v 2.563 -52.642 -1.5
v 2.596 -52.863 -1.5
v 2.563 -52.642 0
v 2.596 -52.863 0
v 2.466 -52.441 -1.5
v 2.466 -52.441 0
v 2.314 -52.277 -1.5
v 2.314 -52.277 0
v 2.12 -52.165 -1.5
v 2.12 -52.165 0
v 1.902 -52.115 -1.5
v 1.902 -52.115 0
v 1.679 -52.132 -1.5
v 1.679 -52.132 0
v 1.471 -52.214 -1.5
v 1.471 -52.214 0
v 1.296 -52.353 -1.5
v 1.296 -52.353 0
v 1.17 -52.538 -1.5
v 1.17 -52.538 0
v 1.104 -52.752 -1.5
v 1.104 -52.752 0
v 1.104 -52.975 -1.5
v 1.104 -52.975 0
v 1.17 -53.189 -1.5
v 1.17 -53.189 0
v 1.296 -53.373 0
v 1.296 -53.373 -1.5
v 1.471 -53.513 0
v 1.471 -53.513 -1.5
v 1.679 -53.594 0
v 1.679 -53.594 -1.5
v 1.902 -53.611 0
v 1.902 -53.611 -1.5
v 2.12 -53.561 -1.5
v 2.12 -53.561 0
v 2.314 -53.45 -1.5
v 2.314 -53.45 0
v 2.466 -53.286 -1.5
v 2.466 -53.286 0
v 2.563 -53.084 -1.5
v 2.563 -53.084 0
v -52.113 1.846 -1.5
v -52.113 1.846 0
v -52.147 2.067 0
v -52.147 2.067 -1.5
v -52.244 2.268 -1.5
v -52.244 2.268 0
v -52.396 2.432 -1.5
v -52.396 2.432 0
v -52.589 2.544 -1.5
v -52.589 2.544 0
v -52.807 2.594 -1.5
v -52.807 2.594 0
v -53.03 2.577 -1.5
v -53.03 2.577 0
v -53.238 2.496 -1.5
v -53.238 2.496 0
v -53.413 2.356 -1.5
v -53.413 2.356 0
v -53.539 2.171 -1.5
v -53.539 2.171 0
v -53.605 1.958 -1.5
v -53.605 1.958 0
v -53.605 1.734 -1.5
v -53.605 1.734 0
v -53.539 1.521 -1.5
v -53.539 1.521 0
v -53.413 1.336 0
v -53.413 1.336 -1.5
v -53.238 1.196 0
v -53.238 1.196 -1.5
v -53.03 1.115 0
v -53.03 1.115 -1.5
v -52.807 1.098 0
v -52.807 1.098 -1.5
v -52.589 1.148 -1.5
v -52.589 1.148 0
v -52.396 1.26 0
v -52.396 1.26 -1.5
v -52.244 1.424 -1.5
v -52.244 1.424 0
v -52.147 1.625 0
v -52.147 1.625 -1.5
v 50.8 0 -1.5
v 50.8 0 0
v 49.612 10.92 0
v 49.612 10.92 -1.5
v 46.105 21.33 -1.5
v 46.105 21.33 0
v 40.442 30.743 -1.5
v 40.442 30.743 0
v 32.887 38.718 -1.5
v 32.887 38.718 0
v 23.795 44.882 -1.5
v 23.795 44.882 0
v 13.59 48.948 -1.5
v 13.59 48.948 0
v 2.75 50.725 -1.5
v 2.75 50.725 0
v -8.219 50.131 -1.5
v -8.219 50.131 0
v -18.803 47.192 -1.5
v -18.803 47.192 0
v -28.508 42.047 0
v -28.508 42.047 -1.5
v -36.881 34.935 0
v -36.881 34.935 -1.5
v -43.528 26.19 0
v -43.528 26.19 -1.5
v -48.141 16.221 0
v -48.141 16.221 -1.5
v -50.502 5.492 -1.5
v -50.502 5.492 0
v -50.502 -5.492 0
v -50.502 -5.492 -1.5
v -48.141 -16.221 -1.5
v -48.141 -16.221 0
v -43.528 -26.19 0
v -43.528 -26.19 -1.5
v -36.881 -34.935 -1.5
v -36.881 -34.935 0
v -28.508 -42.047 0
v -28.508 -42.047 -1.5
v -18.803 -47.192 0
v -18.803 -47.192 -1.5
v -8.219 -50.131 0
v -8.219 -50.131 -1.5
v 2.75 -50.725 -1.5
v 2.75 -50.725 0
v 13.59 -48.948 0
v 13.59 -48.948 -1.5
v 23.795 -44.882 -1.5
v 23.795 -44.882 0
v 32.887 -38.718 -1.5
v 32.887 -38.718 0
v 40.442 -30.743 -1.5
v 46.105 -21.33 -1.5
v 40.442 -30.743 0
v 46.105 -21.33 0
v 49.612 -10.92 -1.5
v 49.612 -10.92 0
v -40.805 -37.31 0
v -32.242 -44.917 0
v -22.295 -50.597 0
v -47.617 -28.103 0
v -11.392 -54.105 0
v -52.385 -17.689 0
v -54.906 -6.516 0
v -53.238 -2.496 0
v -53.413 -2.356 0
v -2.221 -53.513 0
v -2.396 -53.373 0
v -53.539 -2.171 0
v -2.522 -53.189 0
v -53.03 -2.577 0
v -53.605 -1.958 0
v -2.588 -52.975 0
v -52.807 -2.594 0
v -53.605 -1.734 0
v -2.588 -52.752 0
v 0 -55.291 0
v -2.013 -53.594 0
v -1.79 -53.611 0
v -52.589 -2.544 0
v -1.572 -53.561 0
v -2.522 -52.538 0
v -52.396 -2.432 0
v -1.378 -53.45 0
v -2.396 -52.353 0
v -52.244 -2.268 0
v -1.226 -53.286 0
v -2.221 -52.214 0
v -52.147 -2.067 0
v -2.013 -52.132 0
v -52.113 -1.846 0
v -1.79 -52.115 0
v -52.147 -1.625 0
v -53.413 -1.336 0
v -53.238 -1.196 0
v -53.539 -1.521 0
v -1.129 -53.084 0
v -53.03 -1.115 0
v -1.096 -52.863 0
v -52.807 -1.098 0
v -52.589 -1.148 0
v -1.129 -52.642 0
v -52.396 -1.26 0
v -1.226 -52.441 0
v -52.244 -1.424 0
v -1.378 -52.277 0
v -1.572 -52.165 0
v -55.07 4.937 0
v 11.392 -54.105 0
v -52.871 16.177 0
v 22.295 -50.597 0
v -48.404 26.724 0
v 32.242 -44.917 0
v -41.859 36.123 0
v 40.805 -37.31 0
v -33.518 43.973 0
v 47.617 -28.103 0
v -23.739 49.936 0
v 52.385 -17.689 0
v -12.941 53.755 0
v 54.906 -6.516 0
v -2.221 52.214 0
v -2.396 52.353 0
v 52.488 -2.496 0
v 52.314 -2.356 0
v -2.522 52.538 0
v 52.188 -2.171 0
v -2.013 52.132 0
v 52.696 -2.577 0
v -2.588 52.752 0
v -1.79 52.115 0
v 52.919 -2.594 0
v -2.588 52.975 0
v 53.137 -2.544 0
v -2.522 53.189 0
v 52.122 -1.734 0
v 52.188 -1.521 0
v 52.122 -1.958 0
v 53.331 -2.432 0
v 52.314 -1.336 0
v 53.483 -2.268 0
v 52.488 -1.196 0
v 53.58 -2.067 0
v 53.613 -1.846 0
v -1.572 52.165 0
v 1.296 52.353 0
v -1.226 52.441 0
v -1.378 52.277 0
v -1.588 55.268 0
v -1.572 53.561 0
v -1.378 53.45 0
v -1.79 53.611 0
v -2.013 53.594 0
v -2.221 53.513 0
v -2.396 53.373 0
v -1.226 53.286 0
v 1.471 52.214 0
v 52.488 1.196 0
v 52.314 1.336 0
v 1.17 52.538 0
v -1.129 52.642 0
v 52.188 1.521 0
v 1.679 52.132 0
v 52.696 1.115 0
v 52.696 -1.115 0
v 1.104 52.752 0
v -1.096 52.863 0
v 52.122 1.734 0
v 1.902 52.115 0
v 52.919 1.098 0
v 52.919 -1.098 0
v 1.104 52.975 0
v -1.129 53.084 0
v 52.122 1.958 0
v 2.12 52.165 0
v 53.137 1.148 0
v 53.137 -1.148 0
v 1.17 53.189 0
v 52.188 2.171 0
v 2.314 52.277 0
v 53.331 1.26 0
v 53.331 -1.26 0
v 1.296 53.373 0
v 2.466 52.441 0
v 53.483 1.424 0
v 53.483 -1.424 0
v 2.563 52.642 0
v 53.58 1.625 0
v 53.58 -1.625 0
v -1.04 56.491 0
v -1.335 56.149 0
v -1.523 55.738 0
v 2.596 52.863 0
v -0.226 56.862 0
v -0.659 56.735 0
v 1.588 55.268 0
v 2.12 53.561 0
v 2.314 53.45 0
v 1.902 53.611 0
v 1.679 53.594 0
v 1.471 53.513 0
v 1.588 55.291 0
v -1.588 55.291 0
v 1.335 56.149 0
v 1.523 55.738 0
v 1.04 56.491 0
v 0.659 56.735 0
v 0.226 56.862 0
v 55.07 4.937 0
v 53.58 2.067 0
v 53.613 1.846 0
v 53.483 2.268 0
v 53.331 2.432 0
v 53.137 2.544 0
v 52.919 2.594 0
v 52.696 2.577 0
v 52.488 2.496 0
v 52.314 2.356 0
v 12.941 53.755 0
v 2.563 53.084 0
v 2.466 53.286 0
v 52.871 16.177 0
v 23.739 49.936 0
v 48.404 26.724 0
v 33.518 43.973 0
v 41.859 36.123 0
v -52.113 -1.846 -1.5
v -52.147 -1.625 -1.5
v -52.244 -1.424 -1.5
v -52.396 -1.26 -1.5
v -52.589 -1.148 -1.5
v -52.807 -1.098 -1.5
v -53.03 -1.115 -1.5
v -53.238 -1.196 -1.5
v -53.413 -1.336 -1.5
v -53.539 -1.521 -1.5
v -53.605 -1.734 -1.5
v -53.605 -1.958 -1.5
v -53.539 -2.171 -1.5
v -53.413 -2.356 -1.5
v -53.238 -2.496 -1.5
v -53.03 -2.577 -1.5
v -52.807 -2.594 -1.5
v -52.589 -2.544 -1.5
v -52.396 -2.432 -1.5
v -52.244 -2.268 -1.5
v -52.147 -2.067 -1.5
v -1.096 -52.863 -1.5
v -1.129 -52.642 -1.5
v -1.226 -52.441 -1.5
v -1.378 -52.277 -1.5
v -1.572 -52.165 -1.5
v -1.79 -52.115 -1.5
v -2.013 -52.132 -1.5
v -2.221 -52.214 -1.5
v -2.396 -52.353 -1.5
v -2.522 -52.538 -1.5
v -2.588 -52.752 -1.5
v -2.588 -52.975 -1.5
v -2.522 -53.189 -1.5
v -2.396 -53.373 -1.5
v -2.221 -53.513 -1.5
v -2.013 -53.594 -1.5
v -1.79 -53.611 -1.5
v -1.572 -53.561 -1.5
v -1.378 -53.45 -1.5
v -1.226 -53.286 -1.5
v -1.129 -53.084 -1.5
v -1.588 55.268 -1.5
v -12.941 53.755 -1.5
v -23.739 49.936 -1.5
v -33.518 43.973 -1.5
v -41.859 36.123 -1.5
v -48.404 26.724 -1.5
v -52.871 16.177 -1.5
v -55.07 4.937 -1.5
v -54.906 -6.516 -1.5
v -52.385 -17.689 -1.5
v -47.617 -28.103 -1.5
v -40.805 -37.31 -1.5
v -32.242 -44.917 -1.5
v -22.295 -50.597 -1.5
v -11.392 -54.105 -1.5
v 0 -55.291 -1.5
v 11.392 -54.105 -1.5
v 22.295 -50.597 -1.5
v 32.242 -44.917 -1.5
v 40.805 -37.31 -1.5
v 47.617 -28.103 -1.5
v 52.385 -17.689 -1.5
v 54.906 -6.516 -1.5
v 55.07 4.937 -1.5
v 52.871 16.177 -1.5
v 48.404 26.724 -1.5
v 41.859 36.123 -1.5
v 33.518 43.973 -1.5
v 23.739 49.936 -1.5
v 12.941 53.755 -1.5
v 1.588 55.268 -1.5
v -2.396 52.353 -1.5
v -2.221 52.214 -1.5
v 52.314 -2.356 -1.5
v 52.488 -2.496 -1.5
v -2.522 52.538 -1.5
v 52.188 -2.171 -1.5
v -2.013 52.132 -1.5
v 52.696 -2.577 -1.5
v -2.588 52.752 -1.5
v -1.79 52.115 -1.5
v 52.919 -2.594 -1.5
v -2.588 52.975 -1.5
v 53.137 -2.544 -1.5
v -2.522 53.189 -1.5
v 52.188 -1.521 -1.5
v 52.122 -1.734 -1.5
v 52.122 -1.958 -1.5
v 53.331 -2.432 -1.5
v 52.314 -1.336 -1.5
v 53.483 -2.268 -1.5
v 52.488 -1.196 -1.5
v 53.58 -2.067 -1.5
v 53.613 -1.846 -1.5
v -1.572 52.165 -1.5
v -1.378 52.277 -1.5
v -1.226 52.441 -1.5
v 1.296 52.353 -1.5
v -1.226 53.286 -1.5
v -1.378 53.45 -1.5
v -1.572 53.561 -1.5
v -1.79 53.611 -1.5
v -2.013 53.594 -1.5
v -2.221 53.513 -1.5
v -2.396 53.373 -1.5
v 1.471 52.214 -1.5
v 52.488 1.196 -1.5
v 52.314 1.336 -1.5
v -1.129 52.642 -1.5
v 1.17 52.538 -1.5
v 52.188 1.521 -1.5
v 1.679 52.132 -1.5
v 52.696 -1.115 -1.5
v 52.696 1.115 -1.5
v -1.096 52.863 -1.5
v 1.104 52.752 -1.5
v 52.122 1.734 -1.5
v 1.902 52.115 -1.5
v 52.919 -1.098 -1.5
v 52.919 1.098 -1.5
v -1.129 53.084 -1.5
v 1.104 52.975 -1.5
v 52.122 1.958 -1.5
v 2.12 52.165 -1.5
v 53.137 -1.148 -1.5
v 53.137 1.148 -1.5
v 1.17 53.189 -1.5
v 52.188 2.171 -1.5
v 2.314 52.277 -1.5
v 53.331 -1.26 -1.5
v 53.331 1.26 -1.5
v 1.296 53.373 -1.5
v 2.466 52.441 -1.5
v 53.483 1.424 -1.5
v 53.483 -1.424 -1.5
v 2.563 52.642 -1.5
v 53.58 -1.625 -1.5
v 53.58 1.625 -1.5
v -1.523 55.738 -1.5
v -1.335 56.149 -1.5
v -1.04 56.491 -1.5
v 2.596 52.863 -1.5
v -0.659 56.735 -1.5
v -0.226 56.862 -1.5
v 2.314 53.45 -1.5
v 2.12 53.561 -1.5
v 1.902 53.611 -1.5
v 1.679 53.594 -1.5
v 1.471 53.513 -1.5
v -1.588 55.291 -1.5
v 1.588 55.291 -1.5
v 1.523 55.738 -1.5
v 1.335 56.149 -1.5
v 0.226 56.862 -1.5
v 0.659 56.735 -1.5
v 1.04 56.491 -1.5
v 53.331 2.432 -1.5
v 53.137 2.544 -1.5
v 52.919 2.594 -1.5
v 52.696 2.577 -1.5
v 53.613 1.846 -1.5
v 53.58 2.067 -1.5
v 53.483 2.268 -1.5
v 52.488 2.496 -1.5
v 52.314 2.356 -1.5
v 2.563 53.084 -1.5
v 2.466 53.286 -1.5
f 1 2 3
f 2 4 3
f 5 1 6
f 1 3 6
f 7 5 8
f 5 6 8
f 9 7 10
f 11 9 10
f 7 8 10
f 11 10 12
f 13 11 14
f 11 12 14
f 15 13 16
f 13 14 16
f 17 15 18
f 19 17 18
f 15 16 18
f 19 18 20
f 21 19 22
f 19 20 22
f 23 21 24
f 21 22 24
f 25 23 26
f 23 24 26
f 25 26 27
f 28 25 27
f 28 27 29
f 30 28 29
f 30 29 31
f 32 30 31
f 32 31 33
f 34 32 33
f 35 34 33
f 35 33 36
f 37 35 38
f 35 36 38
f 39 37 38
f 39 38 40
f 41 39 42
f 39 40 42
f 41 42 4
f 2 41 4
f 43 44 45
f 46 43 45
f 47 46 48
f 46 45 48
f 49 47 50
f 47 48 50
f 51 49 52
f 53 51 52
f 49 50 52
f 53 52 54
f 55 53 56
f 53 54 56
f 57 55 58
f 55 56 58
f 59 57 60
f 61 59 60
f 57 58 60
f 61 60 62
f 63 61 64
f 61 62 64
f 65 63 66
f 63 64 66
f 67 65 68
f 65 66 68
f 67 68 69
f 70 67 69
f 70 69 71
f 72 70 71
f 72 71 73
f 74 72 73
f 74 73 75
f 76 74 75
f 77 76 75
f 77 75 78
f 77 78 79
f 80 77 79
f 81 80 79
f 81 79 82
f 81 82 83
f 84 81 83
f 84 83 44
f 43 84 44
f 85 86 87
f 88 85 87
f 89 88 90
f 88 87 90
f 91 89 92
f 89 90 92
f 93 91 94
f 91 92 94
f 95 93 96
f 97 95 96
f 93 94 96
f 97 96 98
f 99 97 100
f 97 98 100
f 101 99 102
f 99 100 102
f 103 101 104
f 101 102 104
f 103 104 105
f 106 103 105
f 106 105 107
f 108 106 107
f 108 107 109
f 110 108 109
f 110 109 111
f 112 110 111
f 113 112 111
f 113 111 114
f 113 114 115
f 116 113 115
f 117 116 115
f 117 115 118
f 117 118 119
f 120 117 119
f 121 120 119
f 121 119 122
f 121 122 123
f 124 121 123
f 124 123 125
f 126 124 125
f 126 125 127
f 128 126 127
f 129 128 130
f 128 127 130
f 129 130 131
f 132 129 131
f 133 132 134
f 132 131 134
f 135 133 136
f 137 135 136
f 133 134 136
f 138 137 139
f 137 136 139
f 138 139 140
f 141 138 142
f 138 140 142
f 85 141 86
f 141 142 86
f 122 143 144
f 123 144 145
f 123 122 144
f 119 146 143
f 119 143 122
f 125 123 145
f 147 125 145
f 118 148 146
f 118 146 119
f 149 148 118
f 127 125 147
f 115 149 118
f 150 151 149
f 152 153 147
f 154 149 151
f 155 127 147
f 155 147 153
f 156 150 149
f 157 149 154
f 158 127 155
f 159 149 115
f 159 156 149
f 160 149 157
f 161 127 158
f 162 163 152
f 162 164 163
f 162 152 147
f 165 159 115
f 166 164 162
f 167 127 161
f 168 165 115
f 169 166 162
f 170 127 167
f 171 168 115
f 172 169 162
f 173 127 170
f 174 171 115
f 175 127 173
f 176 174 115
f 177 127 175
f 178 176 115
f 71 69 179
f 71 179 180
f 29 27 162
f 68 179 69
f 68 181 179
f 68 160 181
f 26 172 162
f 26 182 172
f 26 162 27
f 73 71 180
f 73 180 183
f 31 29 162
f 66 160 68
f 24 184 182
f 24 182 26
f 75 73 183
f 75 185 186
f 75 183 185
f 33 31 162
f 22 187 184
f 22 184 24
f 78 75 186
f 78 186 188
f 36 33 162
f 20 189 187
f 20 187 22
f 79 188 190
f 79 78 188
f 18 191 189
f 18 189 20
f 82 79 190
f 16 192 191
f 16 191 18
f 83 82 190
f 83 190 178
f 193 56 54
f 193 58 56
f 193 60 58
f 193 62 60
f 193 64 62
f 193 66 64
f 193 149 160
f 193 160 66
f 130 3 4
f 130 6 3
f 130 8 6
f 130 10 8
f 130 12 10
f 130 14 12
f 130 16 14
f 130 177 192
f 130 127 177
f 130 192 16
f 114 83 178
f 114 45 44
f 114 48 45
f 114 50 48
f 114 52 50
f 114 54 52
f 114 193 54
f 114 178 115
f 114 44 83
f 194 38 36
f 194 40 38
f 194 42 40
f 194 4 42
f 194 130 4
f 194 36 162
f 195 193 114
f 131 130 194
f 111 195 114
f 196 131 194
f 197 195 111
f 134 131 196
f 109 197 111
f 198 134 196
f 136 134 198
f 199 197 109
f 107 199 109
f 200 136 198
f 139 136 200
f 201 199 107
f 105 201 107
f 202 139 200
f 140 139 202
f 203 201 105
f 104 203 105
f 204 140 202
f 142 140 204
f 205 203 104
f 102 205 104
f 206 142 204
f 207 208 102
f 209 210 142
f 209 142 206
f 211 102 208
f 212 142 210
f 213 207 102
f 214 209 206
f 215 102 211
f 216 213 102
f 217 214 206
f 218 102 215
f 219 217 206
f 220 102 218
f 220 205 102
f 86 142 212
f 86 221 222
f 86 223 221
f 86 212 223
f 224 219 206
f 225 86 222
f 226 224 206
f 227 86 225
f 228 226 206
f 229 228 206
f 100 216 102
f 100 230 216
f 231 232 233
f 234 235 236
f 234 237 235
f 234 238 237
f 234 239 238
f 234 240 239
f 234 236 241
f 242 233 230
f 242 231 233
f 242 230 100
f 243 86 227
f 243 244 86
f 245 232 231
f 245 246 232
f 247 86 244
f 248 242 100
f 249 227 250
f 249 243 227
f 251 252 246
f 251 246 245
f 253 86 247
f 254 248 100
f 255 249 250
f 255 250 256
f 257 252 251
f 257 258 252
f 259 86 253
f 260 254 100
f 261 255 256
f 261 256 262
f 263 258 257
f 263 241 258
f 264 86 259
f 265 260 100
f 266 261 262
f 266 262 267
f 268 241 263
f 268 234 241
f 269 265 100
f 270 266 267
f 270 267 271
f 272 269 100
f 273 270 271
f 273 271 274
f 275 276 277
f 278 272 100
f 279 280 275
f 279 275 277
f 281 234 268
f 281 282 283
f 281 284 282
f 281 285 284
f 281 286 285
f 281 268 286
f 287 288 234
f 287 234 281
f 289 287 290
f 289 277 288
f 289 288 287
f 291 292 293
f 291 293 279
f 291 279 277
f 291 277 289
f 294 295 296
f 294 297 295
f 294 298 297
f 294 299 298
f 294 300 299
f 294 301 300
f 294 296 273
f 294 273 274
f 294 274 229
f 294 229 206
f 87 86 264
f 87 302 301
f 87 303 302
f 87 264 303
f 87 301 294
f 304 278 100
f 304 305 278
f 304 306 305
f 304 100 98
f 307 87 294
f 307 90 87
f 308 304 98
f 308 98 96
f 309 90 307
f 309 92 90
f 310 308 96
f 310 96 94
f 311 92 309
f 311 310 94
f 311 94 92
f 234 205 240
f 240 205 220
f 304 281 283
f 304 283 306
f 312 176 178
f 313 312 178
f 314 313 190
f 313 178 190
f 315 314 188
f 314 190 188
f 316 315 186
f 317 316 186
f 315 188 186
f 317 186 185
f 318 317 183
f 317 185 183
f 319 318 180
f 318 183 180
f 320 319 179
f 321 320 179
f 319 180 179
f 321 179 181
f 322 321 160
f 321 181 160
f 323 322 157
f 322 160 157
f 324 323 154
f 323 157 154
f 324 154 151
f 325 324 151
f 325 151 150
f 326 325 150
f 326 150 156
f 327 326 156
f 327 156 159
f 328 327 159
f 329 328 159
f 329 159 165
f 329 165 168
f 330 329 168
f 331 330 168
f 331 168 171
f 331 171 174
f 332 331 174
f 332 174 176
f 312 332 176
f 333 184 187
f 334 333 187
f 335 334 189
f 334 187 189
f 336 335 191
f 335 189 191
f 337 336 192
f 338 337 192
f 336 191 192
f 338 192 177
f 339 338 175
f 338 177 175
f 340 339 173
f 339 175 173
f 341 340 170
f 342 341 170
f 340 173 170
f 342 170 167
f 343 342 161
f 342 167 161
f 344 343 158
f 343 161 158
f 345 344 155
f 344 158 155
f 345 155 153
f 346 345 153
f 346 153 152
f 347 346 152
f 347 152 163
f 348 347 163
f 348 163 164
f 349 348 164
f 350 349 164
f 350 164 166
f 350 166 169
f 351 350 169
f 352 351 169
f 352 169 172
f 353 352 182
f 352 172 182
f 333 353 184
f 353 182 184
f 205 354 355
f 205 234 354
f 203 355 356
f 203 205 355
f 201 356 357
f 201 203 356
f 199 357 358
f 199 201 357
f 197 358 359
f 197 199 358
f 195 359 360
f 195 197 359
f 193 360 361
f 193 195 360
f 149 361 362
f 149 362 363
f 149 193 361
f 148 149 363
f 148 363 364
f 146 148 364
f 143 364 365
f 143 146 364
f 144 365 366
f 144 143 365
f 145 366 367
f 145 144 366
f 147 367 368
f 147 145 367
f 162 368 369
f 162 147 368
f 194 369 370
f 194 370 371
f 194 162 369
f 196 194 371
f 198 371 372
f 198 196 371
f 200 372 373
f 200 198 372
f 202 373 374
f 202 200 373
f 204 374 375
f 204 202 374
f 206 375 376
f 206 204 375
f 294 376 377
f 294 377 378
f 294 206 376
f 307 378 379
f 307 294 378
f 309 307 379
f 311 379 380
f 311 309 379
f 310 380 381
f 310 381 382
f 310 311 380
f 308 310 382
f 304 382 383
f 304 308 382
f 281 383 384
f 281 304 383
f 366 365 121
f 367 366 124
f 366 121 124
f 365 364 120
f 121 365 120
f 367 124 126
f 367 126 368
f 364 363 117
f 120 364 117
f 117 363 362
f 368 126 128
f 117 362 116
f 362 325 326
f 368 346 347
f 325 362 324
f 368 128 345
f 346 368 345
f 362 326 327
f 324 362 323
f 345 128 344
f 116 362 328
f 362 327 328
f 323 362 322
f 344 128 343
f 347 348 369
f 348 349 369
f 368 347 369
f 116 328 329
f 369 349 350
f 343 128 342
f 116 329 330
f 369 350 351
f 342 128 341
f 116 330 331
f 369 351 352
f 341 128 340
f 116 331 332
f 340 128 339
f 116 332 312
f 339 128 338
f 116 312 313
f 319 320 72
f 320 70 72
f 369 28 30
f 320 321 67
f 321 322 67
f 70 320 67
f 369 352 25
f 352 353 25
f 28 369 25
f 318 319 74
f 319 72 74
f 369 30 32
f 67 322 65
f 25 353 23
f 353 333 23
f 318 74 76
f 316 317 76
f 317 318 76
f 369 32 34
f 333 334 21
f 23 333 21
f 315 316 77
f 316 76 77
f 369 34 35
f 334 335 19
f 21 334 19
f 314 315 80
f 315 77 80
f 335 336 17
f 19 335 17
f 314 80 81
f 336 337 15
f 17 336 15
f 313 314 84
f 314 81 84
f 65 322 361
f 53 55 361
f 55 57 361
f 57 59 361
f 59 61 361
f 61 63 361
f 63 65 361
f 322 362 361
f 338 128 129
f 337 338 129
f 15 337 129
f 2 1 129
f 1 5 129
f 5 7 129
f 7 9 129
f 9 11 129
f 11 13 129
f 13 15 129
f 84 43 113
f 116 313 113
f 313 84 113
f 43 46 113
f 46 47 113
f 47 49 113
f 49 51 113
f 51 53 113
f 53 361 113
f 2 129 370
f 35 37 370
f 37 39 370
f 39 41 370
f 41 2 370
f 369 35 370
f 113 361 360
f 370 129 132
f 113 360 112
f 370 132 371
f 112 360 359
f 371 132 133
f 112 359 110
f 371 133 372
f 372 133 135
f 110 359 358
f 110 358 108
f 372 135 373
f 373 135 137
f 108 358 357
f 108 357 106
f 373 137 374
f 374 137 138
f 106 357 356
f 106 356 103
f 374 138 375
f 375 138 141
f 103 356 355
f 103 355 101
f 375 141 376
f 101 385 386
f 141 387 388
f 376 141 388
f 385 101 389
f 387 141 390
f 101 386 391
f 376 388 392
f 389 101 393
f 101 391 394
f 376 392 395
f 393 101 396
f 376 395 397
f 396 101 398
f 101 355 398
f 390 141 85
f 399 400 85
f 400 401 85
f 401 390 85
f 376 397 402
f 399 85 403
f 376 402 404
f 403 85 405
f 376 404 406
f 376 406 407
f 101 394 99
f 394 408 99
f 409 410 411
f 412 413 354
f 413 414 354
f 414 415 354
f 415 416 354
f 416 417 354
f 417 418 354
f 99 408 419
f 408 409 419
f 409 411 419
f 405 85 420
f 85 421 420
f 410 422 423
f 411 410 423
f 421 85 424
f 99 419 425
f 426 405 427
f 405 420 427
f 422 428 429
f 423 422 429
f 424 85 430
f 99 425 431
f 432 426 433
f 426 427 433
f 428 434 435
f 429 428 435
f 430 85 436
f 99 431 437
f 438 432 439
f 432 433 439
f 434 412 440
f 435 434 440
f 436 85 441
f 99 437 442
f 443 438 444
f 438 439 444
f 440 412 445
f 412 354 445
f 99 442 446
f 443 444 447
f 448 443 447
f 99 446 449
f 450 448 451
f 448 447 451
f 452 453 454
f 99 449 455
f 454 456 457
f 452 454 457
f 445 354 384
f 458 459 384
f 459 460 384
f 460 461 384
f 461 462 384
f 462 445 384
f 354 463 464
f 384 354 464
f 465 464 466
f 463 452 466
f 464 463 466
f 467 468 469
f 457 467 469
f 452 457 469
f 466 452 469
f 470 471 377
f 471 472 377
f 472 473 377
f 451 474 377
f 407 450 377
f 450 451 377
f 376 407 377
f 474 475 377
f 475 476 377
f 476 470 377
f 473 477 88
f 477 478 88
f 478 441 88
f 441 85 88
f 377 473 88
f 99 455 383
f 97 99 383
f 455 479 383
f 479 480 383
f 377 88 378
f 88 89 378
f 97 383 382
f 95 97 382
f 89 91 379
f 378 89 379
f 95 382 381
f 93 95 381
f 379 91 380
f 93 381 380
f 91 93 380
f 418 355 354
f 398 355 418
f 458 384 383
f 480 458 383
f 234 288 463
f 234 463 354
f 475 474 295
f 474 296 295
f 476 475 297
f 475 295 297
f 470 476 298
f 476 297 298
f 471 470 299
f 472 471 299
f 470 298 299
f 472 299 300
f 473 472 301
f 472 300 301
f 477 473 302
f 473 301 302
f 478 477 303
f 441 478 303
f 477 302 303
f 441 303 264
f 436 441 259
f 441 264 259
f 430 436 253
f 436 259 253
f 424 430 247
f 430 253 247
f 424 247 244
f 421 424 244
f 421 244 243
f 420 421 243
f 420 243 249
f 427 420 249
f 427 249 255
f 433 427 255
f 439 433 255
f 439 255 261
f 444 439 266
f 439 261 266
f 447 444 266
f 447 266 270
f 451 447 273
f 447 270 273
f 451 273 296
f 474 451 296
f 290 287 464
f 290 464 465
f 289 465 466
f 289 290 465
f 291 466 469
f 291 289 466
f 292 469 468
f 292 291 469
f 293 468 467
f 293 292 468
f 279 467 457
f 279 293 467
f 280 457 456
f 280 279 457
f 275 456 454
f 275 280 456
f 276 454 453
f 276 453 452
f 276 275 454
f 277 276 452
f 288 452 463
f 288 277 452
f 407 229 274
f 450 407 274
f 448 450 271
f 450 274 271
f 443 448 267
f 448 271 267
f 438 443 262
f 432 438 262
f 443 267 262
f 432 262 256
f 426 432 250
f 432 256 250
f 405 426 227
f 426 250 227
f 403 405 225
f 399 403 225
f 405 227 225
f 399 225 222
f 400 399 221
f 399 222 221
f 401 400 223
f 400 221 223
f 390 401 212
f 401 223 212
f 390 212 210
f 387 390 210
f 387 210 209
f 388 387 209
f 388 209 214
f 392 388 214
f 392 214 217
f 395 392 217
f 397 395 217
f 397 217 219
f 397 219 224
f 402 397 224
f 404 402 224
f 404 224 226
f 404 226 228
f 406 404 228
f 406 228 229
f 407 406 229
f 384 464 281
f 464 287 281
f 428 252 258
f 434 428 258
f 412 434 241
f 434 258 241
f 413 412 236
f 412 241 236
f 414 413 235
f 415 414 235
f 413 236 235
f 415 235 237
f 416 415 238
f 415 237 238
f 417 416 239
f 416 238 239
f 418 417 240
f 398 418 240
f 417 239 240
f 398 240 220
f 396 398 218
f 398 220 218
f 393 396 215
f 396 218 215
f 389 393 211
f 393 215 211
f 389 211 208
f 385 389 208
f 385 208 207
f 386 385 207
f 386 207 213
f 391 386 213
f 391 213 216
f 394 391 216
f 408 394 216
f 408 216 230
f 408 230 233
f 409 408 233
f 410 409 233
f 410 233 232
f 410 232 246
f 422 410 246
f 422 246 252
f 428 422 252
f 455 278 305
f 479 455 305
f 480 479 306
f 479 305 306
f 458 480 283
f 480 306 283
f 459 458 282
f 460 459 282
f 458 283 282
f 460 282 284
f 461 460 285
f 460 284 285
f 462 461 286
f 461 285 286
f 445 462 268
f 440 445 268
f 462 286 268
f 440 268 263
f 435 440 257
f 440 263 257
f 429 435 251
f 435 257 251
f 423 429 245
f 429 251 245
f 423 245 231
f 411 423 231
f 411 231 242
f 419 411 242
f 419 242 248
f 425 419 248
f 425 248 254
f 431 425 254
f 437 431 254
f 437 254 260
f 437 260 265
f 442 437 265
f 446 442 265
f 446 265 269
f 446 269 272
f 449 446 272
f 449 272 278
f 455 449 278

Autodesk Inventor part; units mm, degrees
ref_plane "YZ Plane" through (0, 0, 0) normal (1, 0, 0) x (0, 1, 0)
ref_plane "XZ Plane" through (0, 0, 0) normal (0, 1, 0) x (-1, 0, 0)
ref_plane "XY Plane" through (0, 0, 0) normal (0, 0, 1) x (1, 0, 0)
sketch "Sketch1" plane through (0, 0, 0) normal (0, 0, 1) x (1, 0, 0)
  arc A0 (-1.5875, 55.2682) -> (1.5875, 55.2682) centre (0, 0) ccw
  circle A1 centre (0, 0) radius 50.8
  line L0 (0, 79.3124) -> (0, -77.7249) construction
  line L1 (-77.4074, 0) -> (77.4074, 0) construction
  circle A2 centre (0, 0) radius 52.8955 construction
  circle A3 centre (-1.846, 52.8633) radius 0.75
  circle A4 centre (1.846, 52.8633) radius 0.75
  circle A5 centre (-52.8633, -1.846) radius 0.75
  circle A6 centre (-52.8633, 1.846) radius 0.75
  circle A7 centre (1.846, -52.8633) radius 0.75
  circle A8 centre (-1.846, -52.8633) radius 0.75
  circle A9 centre (52.8633, 1.846) radius 0.75
  circle A10 centre (52.8633, -1.846) radius 0.75
  arc A11 (1.5875, 55.291) -> (-1.5875, 55.291) centre (0, 55.291) ccw
  line L2 (-1.5875, 55.291) -> (-1.5875, 55.2682)
  line L3 (1.5875, 55.291) -> (1.5875, 55.2682)
  dimension "d0" = 110.582
  dimension "d1" = 101.6
  dimension "d4" = 105.791
  dimension "d5" = 4
  dimension "d6" = 1.5
  dimension "d9" = 360
  dimension "d11" = 3.175
extrude "Extrusion1" add sketch "Sketch1" against normal blind 1.5
properties part number "J005536" material "ACRYLIC, CLEAR"
